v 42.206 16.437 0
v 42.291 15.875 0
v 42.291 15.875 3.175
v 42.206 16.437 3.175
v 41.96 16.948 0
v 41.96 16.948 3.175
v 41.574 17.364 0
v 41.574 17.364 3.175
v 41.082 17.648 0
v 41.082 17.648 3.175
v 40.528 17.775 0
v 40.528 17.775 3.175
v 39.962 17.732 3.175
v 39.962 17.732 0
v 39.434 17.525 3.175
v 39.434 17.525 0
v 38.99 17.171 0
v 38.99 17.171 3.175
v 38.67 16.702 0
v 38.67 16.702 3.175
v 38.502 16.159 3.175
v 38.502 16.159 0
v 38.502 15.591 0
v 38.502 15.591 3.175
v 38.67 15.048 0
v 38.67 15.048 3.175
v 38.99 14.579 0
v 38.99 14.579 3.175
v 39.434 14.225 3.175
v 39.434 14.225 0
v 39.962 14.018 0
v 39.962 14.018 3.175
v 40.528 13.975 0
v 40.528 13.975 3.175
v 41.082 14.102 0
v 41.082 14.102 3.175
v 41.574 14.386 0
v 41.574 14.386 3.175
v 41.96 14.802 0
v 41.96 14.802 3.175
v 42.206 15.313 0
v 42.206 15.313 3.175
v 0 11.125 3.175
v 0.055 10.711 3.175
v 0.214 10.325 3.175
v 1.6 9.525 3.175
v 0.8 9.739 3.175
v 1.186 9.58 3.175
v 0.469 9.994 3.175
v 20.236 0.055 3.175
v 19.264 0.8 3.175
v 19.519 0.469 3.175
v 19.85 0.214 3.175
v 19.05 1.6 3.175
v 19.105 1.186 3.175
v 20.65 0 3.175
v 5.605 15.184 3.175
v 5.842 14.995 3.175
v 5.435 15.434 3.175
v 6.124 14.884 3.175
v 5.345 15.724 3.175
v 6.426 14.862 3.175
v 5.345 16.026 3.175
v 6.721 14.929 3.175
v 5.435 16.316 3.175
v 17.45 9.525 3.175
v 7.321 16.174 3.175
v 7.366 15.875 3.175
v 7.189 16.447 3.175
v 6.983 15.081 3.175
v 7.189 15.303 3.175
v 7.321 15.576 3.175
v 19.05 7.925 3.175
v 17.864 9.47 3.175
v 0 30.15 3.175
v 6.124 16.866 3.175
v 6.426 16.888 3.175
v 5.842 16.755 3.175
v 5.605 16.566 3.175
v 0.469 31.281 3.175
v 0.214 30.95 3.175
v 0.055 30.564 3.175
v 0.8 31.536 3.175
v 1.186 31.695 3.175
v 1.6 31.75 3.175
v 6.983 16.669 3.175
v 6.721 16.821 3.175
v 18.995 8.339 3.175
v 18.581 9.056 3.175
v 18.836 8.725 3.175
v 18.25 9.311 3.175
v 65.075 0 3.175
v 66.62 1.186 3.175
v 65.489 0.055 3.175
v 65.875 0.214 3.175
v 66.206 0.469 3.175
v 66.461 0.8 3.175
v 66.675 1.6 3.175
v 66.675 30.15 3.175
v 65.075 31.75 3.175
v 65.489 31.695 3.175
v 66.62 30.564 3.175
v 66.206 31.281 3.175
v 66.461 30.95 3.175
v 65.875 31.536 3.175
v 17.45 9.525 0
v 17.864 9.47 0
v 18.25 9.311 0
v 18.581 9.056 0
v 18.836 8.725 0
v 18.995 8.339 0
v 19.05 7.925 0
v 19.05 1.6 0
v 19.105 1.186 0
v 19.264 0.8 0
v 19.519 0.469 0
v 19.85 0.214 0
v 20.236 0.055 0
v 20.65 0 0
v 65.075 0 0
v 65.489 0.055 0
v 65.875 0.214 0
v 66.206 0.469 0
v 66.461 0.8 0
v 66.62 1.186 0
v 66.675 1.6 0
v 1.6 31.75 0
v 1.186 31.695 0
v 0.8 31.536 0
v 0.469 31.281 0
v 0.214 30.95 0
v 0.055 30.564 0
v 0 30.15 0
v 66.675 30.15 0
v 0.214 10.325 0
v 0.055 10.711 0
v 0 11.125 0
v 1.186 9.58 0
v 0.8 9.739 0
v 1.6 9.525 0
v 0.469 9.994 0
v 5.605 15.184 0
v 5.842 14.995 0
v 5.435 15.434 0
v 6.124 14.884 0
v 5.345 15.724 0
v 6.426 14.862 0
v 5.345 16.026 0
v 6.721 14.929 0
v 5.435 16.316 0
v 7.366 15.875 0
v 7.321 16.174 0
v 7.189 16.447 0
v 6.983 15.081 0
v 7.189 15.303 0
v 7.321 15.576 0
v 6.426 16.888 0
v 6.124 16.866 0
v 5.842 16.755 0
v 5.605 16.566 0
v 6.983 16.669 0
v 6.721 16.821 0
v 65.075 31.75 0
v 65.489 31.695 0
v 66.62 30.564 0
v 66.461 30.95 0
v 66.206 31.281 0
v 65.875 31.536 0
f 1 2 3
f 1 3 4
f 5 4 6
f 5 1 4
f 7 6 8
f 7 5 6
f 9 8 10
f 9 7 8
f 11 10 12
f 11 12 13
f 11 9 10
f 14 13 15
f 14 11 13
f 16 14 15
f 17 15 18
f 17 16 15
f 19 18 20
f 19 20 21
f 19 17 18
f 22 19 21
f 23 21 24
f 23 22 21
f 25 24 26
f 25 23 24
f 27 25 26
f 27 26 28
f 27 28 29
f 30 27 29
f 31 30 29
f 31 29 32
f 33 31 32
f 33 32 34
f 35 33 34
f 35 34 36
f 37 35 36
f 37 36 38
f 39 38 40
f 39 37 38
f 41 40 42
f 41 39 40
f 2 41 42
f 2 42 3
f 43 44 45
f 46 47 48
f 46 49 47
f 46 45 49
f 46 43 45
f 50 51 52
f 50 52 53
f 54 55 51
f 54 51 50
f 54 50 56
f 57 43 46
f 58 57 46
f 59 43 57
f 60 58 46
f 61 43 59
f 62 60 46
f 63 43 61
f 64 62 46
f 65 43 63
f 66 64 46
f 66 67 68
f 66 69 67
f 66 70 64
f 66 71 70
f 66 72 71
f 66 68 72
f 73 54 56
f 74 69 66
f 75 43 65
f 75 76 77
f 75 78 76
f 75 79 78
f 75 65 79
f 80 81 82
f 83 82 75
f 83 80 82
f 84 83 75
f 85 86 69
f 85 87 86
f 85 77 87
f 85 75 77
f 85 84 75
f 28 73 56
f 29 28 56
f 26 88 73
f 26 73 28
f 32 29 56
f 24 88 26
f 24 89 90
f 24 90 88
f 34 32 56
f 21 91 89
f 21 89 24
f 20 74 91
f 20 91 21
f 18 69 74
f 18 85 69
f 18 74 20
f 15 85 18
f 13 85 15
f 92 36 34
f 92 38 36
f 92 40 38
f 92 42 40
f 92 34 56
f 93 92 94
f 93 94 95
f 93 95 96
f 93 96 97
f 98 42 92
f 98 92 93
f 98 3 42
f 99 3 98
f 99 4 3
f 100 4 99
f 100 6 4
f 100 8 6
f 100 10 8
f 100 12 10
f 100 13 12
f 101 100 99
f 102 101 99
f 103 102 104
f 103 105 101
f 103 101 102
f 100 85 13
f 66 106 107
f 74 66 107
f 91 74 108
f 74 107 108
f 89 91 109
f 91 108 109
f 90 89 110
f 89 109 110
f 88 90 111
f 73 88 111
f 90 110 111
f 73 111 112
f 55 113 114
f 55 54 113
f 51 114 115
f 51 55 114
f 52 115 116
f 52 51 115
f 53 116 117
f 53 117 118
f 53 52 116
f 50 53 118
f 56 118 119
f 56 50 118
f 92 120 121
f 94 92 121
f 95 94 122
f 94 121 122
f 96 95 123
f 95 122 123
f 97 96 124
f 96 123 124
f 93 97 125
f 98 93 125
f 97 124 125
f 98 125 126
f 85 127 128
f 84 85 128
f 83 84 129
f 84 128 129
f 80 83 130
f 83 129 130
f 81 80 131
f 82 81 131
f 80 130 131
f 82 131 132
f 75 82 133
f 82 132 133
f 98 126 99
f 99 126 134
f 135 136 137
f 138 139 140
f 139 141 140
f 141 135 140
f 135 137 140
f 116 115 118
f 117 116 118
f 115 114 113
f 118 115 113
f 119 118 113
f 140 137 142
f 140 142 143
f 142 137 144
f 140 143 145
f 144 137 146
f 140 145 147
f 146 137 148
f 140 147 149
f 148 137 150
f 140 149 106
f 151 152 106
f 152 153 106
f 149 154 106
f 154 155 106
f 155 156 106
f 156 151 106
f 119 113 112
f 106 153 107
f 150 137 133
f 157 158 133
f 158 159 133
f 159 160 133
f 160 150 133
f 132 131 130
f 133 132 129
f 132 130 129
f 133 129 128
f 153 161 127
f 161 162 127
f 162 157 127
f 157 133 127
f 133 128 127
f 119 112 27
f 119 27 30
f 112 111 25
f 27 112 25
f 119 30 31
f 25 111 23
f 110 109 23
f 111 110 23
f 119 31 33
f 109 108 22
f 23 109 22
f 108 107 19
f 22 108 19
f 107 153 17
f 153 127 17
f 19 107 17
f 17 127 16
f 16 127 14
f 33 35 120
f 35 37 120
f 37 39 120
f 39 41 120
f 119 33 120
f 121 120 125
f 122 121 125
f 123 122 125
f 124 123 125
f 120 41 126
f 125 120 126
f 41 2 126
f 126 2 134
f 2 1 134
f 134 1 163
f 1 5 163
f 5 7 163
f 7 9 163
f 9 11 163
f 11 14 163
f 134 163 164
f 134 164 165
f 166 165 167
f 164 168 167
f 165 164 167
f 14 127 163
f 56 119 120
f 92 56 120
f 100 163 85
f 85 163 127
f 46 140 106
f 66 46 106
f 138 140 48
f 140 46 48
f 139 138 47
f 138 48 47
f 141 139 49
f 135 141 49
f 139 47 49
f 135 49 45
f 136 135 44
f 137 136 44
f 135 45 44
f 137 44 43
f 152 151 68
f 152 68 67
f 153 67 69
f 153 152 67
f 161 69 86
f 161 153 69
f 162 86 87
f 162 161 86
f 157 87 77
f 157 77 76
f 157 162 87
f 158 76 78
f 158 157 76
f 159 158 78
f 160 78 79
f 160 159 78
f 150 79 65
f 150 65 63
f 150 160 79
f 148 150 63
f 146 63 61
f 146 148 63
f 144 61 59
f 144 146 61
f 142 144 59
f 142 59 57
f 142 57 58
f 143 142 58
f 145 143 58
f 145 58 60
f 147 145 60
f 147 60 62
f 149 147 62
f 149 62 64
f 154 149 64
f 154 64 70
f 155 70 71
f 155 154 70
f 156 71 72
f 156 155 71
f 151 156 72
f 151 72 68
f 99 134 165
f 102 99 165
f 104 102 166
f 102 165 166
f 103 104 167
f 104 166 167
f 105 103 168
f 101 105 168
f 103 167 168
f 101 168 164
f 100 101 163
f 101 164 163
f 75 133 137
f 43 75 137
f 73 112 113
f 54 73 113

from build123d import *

# Parameters (mm, degrees)
F0_R     = 1.016
F0_R_2   = 1.905
F1_DEPTH = 3.175
F2_R     = 1.6002


with BuildPart() as f1:
    # F0 (on Top) → F1 (new body)
    with BuildSketch(Plane.XY):
        with BuildLine():
            Line((19.05, 7.9248), (19.05, 0))
            Line((19.05, 0), (65.0748, 0))
            ThreePointArc((65.0748, 0), (66.206312, 0.468688), (66.675, 1.6002))
            Line((66.675, 1.6002), (66.675, 30.1498))
            ThreePointArc((66.675, 30.1498), (66.206312, 31.281312), (65.0748, 31.75))
            Line((65.0748, 31.75), (1.6002, 31.75))
            ThreePointArc((1.6002, 31.75), (0.468688, 31.281312), (0, 30.1498))
            Line((0, 30.1498), (0, 9.525))
            Line((0, 9.525), (17.4498, 9.525))
            ThreePointArc((17.4498, 9.525), (18.581312, 9.056312), (19.05, 7.9248))
        make_face()
        with Locations((6.35, 15.875)):
            Circle(F0_R, mode=Mode.SUBTRACT)
        with Locations((40.386, 15.875)):
            Circle(F0_R_2, mode=Mode.SUBTRACT)
    extrude(amount=F1_DEPTH)

    # F2
    f2_edges = [f1.edges().sort_by_distance(p)[0] for p in [
        (0, 9.525, 1.5875),
        (19.05, 0, 1.5875),
    ]]
    fillet(f2_edges, radius=F2_R)


solid = f1.part
